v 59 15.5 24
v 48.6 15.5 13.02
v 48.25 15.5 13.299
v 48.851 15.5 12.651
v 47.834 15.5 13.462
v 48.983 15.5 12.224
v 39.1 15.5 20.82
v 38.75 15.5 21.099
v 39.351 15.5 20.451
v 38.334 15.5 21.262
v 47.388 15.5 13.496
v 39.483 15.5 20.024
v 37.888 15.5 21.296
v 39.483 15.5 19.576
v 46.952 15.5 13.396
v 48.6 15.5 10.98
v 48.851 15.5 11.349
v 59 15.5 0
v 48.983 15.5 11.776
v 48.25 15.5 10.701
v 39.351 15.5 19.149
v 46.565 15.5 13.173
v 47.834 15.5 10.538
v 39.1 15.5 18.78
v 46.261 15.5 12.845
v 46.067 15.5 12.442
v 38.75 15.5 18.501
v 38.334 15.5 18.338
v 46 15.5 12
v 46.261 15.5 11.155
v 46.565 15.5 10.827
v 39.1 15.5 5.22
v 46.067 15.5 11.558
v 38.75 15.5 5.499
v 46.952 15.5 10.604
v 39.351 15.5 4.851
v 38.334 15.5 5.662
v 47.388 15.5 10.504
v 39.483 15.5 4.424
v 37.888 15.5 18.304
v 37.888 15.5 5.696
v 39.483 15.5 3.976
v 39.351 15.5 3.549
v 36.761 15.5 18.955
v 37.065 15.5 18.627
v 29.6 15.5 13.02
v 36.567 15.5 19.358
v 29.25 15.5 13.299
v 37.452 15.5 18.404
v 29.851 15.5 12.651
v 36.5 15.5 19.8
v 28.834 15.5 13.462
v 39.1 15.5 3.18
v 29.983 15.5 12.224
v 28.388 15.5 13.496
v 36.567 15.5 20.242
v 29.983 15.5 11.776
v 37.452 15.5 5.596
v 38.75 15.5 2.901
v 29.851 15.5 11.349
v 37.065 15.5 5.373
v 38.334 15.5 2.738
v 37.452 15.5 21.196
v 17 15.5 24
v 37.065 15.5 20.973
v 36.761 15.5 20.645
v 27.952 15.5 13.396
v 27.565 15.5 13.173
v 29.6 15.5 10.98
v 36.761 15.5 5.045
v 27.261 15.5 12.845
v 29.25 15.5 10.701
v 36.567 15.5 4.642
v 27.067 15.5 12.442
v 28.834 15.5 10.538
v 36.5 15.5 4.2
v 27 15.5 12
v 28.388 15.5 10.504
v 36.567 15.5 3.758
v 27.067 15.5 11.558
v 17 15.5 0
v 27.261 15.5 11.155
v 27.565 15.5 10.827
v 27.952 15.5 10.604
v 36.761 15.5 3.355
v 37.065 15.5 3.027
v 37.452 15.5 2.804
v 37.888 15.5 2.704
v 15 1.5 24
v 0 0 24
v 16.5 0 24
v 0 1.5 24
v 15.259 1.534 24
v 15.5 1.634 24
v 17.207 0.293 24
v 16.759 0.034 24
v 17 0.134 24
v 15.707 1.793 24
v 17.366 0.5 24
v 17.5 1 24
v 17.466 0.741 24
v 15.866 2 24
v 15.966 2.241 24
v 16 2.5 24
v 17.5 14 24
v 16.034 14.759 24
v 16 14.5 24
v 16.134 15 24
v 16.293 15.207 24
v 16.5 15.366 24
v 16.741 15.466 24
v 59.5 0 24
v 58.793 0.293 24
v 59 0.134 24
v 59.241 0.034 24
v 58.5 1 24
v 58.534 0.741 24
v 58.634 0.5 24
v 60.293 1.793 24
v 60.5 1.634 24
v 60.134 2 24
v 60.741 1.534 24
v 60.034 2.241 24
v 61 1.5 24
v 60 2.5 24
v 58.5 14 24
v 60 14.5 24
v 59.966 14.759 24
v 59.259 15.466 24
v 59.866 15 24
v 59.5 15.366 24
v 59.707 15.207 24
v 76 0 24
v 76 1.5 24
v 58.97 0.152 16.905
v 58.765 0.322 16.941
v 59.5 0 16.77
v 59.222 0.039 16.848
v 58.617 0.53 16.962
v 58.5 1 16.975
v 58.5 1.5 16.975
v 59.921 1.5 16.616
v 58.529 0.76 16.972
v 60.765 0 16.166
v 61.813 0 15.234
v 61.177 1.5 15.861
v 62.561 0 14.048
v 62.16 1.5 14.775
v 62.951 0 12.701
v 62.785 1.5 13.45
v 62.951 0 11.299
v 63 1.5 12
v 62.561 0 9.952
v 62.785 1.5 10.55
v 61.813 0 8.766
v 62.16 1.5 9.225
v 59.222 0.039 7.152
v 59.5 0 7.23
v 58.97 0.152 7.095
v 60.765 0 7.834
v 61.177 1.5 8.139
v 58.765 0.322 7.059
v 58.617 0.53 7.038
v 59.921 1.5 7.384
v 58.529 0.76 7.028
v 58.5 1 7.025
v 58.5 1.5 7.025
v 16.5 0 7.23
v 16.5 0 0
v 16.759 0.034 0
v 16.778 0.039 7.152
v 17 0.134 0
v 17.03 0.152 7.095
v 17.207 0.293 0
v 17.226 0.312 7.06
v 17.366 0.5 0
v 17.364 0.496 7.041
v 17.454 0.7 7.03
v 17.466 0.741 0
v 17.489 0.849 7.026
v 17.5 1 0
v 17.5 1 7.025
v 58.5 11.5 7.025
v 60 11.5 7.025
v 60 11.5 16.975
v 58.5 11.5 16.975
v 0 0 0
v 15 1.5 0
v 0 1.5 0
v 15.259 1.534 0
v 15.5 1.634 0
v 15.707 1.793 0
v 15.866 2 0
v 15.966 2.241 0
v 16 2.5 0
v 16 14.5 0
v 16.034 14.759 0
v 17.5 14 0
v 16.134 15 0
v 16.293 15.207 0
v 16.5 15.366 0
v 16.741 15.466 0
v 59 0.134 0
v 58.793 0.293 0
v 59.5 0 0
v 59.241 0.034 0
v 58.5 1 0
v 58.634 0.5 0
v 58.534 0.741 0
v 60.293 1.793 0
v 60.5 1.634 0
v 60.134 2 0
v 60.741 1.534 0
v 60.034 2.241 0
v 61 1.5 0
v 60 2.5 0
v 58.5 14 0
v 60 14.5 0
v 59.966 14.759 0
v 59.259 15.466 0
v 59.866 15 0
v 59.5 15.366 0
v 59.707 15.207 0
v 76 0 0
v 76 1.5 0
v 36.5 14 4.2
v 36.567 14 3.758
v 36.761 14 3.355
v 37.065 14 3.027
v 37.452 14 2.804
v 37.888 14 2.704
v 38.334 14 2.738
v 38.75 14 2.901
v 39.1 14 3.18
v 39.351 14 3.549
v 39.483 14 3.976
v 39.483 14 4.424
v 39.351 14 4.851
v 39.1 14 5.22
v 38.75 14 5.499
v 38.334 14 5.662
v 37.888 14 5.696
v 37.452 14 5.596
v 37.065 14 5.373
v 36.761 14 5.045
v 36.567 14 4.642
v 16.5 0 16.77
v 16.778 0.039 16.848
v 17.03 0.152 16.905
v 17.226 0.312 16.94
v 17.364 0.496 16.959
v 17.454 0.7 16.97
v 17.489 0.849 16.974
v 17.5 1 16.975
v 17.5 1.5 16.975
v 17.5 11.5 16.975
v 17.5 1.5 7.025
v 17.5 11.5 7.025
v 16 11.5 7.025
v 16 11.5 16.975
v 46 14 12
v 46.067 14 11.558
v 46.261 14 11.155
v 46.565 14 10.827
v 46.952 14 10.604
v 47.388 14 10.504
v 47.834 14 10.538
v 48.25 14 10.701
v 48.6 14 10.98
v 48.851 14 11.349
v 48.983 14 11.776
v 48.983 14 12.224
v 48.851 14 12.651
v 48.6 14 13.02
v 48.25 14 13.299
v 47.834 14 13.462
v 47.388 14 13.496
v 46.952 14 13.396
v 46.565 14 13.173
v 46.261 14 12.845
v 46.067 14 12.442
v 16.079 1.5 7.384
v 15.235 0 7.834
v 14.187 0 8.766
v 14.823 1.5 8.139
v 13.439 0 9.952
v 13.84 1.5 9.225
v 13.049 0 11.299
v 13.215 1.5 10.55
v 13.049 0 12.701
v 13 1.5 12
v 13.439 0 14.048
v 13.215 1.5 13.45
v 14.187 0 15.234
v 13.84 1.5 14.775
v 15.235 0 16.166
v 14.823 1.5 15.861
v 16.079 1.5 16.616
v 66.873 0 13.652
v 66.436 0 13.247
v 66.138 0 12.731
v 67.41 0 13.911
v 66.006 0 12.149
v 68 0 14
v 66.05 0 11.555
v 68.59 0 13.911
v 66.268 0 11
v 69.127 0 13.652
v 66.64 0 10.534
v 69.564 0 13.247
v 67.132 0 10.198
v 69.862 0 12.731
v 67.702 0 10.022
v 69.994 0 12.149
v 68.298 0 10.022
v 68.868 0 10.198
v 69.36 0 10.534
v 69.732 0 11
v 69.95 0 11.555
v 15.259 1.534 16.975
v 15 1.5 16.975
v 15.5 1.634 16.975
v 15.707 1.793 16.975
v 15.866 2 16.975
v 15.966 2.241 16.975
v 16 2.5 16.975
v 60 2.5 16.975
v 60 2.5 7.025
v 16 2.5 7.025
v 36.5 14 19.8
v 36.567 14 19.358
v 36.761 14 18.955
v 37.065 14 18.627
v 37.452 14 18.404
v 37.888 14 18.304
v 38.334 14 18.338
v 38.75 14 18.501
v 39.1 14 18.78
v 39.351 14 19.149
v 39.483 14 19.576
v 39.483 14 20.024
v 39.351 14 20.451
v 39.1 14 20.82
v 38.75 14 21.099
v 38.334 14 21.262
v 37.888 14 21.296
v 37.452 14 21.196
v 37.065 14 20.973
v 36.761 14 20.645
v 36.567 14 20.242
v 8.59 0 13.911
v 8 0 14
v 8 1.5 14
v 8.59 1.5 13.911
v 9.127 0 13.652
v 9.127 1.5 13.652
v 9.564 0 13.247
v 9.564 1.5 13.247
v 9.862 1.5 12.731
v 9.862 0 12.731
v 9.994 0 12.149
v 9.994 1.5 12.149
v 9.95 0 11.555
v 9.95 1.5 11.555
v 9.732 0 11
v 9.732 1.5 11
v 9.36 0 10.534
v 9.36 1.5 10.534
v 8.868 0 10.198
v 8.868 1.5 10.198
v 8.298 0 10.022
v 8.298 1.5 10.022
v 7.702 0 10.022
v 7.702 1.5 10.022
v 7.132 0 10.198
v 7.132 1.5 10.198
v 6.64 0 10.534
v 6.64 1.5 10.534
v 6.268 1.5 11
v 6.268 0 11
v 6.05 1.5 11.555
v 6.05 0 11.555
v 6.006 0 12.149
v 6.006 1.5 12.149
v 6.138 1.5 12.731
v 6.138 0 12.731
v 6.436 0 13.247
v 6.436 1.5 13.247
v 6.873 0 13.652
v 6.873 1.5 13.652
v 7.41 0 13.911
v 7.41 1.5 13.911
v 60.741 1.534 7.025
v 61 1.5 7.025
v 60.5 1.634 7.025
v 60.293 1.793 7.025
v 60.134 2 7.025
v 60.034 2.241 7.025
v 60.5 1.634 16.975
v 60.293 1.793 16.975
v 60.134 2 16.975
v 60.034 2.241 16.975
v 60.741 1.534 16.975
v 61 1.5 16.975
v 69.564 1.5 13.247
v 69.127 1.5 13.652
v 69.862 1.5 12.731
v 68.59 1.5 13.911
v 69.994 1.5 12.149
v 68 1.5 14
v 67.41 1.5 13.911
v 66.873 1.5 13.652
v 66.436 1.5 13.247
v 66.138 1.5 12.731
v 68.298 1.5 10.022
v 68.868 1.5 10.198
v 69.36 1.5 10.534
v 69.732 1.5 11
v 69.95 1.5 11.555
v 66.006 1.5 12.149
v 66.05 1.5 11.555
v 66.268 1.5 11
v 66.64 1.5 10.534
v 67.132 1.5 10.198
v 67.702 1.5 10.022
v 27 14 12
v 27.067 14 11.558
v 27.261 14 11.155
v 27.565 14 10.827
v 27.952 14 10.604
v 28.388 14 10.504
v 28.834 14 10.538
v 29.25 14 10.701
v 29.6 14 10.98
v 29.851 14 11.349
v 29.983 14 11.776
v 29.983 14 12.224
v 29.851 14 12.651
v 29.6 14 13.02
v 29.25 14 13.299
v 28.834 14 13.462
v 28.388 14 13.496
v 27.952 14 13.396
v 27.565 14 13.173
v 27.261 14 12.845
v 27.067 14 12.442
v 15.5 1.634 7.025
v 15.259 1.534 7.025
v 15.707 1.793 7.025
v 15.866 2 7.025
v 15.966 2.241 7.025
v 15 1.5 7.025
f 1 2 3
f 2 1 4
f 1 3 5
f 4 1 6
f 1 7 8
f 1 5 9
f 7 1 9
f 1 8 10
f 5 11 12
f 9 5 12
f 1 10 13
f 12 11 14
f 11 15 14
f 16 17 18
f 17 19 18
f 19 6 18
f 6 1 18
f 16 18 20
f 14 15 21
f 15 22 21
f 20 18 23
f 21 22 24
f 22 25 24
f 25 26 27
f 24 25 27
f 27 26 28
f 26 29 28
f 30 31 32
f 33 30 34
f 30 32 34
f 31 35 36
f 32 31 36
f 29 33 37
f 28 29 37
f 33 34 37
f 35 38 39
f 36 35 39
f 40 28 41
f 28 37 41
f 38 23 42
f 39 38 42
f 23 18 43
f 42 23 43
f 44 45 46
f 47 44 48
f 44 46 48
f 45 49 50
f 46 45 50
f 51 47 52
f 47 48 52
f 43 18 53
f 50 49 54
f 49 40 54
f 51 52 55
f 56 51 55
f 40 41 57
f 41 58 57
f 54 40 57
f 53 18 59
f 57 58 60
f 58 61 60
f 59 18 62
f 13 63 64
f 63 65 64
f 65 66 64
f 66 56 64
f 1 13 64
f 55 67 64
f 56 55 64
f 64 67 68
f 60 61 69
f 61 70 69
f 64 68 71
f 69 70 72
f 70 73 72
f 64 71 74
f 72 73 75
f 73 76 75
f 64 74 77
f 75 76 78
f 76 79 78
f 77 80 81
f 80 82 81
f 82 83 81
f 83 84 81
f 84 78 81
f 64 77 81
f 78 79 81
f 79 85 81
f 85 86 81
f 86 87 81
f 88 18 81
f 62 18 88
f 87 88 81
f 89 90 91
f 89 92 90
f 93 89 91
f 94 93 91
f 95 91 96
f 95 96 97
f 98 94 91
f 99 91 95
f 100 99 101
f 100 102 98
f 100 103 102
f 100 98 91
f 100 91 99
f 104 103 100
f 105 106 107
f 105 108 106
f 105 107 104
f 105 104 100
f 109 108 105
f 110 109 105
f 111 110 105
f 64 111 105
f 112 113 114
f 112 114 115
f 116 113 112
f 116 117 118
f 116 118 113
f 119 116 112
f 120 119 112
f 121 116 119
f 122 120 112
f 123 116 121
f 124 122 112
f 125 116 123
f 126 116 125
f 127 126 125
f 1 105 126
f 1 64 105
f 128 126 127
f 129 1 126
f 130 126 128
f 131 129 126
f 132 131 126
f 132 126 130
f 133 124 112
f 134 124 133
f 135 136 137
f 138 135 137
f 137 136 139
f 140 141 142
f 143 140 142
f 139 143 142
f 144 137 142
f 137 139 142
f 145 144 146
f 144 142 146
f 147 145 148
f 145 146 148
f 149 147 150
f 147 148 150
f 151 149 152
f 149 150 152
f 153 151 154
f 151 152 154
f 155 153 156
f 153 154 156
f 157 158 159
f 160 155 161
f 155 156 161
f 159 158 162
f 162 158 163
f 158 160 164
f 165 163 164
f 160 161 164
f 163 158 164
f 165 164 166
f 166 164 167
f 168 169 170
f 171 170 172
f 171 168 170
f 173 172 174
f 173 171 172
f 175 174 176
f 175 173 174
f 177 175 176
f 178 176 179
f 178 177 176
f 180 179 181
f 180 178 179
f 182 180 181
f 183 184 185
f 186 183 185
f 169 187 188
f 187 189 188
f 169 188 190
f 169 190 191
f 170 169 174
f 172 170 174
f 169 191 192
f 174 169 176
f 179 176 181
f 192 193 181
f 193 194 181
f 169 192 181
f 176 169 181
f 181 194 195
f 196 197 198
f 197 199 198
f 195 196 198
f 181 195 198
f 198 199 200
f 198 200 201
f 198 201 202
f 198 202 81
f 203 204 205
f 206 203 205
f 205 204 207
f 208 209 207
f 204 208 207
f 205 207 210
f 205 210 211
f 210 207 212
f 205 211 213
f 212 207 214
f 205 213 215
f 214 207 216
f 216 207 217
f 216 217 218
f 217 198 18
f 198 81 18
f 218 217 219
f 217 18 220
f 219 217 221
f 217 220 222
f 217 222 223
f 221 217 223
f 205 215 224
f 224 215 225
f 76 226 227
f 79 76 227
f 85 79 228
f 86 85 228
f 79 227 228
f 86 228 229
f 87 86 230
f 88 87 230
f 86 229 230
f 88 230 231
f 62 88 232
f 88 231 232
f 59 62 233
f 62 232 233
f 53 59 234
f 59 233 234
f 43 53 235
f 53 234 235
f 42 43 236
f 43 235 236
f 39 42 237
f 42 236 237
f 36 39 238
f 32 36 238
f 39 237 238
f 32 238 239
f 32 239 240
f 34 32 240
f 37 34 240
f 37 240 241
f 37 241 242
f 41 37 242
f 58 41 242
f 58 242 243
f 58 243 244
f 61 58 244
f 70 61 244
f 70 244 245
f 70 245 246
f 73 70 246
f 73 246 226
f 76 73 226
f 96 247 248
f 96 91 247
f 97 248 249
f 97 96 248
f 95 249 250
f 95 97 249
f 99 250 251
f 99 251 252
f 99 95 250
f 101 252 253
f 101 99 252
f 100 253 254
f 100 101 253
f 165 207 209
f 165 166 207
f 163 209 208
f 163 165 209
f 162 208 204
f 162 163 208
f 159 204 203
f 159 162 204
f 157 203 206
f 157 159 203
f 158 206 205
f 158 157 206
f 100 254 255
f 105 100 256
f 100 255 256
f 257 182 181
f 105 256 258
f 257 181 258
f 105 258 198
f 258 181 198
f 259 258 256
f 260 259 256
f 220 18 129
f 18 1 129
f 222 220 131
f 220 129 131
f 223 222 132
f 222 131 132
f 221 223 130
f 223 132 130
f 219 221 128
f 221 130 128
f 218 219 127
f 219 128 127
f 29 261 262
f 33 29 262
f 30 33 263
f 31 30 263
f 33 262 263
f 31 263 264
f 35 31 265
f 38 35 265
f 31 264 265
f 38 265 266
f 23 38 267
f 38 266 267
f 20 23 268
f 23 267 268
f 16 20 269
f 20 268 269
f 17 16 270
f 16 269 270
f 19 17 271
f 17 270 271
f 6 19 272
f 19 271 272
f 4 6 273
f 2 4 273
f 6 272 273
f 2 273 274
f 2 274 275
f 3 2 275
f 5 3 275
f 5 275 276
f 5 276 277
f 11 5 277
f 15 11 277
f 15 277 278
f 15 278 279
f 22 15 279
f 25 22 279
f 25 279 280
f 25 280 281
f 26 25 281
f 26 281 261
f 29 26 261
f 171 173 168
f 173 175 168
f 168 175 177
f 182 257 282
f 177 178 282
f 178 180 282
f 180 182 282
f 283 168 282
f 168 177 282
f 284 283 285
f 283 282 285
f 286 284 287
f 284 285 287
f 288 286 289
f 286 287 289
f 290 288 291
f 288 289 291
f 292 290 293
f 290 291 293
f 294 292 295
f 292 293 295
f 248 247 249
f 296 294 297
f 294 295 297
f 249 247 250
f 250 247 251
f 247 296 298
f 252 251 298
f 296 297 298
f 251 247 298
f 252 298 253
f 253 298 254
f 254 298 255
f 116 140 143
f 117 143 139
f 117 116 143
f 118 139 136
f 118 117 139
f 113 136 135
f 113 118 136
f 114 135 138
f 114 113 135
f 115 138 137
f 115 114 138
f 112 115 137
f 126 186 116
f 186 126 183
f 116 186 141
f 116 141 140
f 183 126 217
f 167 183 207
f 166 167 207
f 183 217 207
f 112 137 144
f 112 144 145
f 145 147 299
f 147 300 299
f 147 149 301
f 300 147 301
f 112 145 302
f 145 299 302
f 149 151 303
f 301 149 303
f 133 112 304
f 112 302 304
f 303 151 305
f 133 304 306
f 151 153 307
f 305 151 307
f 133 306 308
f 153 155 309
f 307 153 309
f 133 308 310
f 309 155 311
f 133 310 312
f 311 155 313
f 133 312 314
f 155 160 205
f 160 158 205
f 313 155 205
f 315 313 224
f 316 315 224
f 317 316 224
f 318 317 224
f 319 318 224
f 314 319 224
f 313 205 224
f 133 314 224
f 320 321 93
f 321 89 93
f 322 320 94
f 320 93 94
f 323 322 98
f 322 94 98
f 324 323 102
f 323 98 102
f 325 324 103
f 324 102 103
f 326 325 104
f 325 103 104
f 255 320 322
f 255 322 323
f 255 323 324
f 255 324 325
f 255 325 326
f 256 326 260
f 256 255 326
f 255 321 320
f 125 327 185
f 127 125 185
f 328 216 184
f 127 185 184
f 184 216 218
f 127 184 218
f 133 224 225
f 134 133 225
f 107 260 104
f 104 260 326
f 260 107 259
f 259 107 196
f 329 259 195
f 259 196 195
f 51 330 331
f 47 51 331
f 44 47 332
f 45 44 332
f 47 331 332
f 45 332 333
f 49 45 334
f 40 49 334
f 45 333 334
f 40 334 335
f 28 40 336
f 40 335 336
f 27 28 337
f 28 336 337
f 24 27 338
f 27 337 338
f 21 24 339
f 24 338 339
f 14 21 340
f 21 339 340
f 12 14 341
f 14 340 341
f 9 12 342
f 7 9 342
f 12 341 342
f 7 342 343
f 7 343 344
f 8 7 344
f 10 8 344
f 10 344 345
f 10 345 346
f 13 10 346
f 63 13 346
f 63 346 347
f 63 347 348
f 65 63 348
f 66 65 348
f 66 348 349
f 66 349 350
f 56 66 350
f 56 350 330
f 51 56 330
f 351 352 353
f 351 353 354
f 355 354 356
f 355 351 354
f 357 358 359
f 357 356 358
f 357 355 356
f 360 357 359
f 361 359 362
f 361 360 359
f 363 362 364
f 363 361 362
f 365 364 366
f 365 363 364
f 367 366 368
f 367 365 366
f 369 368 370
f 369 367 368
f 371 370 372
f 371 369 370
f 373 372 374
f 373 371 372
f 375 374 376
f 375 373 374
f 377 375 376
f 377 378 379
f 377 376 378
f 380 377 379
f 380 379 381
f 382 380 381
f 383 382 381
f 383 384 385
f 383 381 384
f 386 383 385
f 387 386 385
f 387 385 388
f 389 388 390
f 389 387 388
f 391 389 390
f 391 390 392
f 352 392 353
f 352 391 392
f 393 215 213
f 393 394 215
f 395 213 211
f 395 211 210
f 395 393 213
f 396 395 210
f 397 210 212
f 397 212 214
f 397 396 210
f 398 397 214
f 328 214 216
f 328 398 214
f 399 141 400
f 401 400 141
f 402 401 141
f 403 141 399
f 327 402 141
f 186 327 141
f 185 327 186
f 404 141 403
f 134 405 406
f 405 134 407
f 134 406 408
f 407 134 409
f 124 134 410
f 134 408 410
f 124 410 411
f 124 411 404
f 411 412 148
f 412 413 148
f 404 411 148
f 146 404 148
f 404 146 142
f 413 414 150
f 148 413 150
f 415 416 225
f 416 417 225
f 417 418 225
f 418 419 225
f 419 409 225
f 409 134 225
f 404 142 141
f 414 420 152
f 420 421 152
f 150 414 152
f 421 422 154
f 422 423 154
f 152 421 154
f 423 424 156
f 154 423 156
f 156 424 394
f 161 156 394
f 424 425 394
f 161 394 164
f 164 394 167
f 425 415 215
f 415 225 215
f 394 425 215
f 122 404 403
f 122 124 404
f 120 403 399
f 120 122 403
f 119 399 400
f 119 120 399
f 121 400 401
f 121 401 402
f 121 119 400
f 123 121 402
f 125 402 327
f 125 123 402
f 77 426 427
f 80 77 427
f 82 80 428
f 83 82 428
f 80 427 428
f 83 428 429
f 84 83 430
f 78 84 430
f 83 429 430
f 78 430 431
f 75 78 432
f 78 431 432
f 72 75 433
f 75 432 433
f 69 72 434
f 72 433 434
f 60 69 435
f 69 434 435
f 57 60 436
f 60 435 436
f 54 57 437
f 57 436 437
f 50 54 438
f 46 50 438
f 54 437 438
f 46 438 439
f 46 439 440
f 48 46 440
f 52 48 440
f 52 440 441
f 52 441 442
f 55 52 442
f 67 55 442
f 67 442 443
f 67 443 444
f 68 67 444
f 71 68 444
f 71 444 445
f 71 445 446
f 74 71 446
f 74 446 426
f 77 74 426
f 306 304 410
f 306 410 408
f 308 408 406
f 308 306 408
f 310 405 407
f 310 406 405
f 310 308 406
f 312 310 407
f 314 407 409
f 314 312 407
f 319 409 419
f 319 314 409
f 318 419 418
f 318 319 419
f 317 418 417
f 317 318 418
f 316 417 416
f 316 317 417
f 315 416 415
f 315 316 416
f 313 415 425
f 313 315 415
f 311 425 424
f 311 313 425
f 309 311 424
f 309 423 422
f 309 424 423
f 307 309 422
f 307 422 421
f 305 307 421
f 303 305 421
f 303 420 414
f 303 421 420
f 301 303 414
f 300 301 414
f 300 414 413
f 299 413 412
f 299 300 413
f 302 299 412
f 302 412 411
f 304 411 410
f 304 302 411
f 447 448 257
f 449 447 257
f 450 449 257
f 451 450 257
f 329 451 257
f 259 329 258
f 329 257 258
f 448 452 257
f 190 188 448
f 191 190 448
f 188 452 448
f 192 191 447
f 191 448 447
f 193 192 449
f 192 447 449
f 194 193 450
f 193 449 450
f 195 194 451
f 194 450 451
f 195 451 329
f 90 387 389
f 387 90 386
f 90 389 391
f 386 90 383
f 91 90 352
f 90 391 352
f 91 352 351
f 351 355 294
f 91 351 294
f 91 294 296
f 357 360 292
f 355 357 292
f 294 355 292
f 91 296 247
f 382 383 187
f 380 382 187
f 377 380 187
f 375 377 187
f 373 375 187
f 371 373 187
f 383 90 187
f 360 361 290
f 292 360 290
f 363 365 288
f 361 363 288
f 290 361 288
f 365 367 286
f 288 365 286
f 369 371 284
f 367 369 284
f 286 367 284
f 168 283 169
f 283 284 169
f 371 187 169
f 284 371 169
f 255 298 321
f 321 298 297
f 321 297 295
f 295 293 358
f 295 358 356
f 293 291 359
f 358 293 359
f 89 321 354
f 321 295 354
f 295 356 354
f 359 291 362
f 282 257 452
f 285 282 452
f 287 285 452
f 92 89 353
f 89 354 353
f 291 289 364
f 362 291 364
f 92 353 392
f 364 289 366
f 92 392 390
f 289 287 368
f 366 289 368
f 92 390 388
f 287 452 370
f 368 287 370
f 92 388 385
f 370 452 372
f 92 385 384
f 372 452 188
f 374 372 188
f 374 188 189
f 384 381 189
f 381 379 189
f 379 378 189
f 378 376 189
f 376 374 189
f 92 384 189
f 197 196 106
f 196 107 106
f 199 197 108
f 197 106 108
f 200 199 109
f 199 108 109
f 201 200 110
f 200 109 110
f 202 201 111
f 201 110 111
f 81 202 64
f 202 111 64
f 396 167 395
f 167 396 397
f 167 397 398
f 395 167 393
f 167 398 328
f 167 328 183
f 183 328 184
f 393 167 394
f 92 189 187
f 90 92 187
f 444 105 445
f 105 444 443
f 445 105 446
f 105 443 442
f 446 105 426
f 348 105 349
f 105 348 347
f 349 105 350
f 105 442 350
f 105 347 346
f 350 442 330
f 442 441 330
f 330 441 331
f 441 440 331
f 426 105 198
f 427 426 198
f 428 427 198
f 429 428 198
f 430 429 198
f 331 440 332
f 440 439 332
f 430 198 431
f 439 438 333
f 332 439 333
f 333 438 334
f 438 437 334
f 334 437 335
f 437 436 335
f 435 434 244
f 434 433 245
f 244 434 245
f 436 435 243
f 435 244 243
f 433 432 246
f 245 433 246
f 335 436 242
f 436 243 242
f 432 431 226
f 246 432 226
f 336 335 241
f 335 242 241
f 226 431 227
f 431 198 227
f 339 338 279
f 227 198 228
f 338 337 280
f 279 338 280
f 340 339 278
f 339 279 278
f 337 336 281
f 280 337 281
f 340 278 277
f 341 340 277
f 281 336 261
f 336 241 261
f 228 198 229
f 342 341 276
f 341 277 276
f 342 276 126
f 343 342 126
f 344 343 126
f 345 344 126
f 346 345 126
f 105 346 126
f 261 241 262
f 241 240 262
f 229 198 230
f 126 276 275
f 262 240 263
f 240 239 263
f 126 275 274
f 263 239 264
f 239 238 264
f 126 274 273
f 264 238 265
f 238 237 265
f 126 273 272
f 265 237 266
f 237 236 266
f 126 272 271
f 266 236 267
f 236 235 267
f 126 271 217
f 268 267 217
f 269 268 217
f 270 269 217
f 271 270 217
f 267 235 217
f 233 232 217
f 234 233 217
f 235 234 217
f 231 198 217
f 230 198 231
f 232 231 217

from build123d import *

# Parameters (mm, degrees)
BOSS_EXTRUDE2_DEPTH     = 24
CUT_EXTRUDE1_DEPTH      = 81.91971329657565
CUT_EXTRUDE1_DEPTH_BACK = 81.91971329657565
SKETCH17_R              = 1.9999999999999996
SKETCH17_R_2            = 1.9999999999999962
F_3_0MM_DOWEL_HOLE1_D   = 3
SKETCH22_R              = 5.000000000000001
SKETCH22_R_2            = 4.9999999999999964
CUT_EXTRUDE2_DEPTH      = 1.5
CUT_EXTRUDE3_DEPTH      = 67.45487190567748
CUT_EXTRUDE3_DEPTH_BACK = 67.45487190567748
SKETCH23_W              = 9.949874371066619
SKETCH23_H              = 10
FILLET1_R               = 1


with BuildPart() as part:
    # 3DSketch1 → Boss-Extrude2 (new body)
    with BuildSketch(Plane(origin=(0, 0, 0), x_dir=(0.9998052854172774, 0.01973299905428837, 0), z_dir=(0, -2.14e-15, 1))):
        Polygon((0, 0), (17.496592494802357, -0.34532748345004655), (17.772854481562394, 13.65194651239183), (58.76487118367076, 12.842893551166007), (58.48860919691073, -1.1543804446758696), (75.98520169171307, -1.499707928125916), (76.0148011902945, 2.2e-16), (60.01791662361808, 0.315727984868614), (60.29417861037812, 14.313001980710496), (16.302746052017905, 15.181253939099182), (16.02648406525787, 1.1839799432573024), (0.02959949858143255, 1.4997079281259162), align=None)
    extrude(amount=BOSS_EXTRUDE2_DEPTH)

    # Sketch17 → Cut-Extrude1 (cut, two sides: drawn at the far end of the back side and taken through both)
    with BuildSketch(Plane(origin=(0, 1.5, 0), x_dir=(1, 0, 0), z_dir=(0, 1, 0)).offset(-CUT_EXTRUDE1_DEPTH_BACK)):
        with Locations(Location((8, -12.000000000000002, 0), (0, 0, 270))):
            Circle(SKETCH17_R)
        with Locations(Location((68, -12.000000000000002, 0), (0, 0, 270))):
            Circle(SKETCH17_R_2)
    extrude(amount=CUT_EXTRUDE1_DEPTH + CUT_EXTRUDE1_DEPTH_BACK, mode=Mode.SUBTRACT)

    # Ø3.0mm Dowel Hole1 (through all)
    with Locations(Plane(origin=(-6.1e-16, 15.499999999999996, 0), x_dir=(1, 0, 0), z_dir=(0, 1, 0))):
        with Locations((28.5, -12), (47.5, -12), (38, -19.8), (38, -4.2)):
            Hole(F_3_0MM_DOWEL_HOLE1_D / 2)

    # Sketch22 → Cut-Extrude2 (cut)
    with BuildSketch(Plane(origin=(0, 1.5, 0), x_dir=(1, 0, 0), z_dir=(0, 1, 0))):
        with Locations((17.999999999997943, -12.000000000000927)):
            Circle(SKETCH22_R)
        with Locations((58.00000000000207, -12.000000000000927)):
            Circle(SKETCH22_R_2)
    extrude(amount=-CUT_EXTRUDE2_DEPTH, mode=Mode.SUBTRACT)

    # Sketch23 → Cut-Extrude3 (cut, two sides: drawn at the far end of the back side and taken through both)
    with BuildSketch(Plane.ZY.offset(-16).offset(-CUT_EXTRUDE3_DEPTH_BACK)):
        with Locations((12.000000000000927, 6.5)):
            Rectangle(SKETCH23_W, SKETCH23_H)
    extrude(amount=CUT_EXTRUDE3_DEPTH + CUT_EXTRUDE3_DEPTH_BACK, mode=Mode.SUBTRACT)

    # Fillet1
    fillet1_edges = [part.edges().sort_by_distance(p)[0] for p in [
        (17.500000000000004, -7.53e-15, 3.5125314072338187),
        (17.500000000000004, -4.389e-14, 20.487468592767108),
        (58.50000000000001, -7.53e-15, 3.5125314072338205),
        (58.50000000000001, -4.389e-14, 20.487468592767108),
        (16, 15.499999999999973, 12.000000000000034),
        (60.000000000000014, 15.499999999999975, 12.000000000000034),
        (60.00000000000001, 1.499999999999956, 20.48746859276712),
        (60.00000000000001, 1.4999999999999925, 3.512531407233811),
        (15.999999999999998, 1.4999999999999565, 20.48746859276712),
        (15.999999999999998, 1.499999999999993, 3.5125314072338107),
    ]]
    fillet(fillet1_edges, radius=FILLET1_R)


solid = part.part
